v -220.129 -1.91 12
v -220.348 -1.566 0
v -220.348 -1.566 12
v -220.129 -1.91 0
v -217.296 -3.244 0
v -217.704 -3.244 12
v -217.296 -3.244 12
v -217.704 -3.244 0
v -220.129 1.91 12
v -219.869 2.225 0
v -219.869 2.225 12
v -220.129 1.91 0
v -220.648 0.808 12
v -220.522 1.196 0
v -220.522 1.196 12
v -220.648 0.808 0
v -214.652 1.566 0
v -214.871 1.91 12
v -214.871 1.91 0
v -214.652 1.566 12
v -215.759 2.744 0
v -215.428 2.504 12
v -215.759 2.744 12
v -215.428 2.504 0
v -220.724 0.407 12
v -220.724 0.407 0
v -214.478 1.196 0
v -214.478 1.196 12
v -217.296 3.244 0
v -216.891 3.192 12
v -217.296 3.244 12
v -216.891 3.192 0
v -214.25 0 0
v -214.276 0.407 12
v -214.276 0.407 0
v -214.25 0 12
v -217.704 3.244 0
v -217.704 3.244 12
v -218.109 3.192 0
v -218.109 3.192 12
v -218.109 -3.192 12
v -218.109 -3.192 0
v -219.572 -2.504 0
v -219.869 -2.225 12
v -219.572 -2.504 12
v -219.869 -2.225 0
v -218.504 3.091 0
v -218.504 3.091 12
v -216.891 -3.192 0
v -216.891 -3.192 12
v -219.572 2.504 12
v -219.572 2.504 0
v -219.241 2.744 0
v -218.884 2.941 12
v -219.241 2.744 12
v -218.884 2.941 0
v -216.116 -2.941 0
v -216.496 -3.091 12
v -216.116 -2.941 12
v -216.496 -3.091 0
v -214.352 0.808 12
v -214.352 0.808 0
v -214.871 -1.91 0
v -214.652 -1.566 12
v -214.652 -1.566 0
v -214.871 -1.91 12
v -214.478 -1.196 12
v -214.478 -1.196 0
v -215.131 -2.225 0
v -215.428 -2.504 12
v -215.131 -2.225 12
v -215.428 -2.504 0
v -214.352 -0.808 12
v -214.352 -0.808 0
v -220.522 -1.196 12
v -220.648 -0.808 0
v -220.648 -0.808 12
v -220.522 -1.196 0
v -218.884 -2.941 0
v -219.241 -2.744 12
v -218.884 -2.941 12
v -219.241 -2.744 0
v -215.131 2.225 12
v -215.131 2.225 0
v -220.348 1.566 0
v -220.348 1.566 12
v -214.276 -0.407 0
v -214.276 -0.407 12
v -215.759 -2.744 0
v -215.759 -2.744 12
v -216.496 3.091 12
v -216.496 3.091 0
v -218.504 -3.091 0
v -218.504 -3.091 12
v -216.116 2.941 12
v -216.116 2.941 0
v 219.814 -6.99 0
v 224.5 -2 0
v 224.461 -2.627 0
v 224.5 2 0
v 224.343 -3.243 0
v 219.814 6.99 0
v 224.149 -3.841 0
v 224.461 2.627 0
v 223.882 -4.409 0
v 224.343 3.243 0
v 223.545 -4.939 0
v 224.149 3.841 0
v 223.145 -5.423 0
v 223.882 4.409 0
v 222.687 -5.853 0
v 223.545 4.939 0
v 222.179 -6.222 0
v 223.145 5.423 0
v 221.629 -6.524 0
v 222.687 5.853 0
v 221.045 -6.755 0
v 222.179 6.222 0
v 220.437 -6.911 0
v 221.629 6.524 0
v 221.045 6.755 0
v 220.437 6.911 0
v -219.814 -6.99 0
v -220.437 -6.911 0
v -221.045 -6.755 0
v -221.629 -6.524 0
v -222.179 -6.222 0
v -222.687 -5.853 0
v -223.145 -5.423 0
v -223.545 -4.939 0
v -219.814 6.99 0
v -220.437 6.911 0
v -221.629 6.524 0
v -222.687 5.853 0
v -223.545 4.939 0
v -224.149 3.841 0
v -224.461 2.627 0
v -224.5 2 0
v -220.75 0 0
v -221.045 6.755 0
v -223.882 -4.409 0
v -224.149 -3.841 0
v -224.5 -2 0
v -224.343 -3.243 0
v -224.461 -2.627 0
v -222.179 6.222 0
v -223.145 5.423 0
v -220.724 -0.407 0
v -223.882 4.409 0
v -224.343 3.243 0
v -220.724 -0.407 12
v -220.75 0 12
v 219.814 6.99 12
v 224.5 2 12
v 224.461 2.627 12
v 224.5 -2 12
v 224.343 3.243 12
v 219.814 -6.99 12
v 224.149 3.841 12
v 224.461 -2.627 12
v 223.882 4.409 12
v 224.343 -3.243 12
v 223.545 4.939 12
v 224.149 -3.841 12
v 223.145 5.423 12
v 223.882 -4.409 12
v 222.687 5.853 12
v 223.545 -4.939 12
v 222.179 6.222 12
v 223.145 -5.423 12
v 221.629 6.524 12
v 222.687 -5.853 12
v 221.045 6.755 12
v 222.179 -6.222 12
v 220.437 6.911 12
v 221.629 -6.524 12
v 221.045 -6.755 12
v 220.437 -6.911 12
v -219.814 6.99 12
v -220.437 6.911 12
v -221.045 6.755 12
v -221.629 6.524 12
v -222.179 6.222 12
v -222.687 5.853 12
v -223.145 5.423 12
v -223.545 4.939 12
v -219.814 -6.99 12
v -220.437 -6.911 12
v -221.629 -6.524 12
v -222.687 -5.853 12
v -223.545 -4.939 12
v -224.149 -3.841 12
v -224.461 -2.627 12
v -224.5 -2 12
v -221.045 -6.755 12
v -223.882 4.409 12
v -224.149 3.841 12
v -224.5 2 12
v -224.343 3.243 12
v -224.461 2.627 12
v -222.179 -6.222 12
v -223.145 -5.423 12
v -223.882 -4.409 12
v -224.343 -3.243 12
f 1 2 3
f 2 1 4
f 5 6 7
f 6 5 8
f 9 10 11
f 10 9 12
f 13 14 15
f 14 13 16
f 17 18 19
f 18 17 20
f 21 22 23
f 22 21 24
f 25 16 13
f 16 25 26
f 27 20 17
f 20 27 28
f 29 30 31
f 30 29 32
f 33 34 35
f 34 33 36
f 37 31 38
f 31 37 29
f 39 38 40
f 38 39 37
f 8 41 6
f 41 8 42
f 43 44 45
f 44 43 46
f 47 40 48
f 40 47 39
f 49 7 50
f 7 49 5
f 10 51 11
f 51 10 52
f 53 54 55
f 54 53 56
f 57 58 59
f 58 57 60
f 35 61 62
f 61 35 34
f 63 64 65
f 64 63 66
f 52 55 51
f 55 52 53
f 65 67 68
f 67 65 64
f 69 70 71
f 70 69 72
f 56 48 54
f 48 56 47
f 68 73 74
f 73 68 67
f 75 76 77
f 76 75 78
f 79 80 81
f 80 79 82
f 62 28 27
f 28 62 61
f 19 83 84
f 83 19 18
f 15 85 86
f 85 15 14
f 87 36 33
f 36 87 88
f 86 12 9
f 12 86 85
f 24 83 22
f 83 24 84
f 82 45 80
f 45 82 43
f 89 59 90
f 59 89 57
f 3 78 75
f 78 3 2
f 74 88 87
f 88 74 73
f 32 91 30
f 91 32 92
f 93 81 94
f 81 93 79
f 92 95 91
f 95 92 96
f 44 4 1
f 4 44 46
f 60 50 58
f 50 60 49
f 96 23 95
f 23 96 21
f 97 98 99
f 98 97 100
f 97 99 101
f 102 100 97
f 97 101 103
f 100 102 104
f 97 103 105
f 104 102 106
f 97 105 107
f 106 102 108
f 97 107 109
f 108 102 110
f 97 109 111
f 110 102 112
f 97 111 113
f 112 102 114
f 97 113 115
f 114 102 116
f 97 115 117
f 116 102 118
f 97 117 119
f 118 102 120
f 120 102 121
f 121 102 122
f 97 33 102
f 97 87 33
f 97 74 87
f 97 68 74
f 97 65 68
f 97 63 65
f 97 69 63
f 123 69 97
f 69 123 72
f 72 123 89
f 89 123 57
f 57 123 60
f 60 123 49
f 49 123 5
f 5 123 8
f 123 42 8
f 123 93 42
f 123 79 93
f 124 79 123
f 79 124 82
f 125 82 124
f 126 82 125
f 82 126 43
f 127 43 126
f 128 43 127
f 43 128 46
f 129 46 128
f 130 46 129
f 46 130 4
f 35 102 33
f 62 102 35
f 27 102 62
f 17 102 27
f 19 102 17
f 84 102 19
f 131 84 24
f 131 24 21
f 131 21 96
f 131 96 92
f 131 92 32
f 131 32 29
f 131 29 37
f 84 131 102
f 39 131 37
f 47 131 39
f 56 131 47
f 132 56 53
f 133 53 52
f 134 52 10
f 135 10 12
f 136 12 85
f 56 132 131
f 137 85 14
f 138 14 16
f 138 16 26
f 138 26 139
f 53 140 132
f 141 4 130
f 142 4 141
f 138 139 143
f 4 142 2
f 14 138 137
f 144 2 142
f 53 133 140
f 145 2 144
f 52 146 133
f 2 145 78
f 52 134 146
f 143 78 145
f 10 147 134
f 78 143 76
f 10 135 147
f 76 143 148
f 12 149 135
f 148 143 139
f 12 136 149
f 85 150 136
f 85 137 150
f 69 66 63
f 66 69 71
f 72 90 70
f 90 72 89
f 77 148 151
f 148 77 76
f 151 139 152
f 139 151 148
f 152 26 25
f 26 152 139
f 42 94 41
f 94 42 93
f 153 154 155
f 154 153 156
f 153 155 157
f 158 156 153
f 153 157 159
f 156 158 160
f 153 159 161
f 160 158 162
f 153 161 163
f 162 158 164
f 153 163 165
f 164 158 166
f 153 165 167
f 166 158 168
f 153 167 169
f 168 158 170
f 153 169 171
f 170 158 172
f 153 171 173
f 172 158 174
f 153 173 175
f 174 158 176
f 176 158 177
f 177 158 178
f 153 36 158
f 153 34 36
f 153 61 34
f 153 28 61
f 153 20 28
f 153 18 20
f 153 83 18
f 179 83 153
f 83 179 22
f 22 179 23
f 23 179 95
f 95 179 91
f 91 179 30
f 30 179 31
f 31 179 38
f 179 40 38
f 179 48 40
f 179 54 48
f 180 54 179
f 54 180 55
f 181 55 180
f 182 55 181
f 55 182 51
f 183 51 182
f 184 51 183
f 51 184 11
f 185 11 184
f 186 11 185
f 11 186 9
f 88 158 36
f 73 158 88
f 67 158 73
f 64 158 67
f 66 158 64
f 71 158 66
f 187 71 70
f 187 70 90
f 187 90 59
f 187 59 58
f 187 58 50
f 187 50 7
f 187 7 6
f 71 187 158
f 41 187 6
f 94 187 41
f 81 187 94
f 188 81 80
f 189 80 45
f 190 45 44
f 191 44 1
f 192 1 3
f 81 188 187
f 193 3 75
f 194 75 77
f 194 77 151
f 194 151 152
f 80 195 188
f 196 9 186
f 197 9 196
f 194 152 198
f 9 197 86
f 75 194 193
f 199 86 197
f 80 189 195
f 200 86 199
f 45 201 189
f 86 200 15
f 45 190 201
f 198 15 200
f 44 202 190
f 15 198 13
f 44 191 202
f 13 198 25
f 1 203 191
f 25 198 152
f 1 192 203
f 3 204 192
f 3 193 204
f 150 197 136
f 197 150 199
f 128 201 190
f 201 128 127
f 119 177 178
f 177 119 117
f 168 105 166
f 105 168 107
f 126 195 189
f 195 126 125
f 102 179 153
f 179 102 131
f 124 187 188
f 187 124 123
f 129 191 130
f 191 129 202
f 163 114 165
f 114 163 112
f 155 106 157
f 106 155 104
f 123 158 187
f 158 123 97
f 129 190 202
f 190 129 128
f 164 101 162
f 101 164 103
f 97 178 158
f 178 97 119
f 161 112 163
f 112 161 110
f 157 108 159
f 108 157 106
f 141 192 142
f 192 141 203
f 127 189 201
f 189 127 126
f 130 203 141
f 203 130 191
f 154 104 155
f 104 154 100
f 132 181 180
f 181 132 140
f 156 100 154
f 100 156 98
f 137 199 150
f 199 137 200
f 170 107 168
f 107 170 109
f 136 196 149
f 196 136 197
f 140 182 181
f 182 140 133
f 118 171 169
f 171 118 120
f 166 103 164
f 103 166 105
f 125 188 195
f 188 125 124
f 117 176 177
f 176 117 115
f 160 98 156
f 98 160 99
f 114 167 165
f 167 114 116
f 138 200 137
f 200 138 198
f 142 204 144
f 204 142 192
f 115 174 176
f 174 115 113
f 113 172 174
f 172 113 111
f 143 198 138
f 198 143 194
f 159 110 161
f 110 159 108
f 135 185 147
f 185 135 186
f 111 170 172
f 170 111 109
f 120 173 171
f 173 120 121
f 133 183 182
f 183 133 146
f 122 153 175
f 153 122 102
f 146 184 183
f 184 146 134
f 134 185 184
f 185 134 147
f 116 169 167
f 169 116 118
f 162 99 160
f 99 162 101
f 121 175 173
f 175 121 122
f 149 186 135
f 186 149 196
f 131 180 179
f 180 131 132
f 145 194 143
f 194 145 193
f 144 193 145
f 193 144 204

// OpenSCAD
$fn = 50;


difference() {
	union() {
		hull() {
			translate(v = [-219.5000000000, 2.0000000000, 0]) {
				cylinder(h = 12, r = 5);
			}
			translate(v = [219.5000000000, 2.0000000000, 0]) {
				cylinder(h = 12, r = 5);
			}
			translate(v = [-219.5000000000, -2.0000000000, 0]) {
				cylinder(h = 12, r = 5);
			}
			translate(v = [219.5000000000, -2.0000000000, 0]) {
				cylinder(h = 12, r = 5);
			}
		}
	}
	union() {
		translate(v = [-217.5000000000, 0.0000000000, 0]) {
			cylinder(h = 12, r = 3.2500000000);
		}
		translate(v = [-217.5000000000, 0.0000000000, 0]) {
			cylinder(h = 12, r = 1.8000000000);
		}
		translate(v = [-217.5000000000, 0.0000000000, 0]) {
			cylinder(h = 12, r = 1.8000000000);
		}
		translate(v = [-217.5000000000, 0.0000000000, 0]) {
			cylinder(h = 12, r = 1.8000000000);
		}
	}
}
